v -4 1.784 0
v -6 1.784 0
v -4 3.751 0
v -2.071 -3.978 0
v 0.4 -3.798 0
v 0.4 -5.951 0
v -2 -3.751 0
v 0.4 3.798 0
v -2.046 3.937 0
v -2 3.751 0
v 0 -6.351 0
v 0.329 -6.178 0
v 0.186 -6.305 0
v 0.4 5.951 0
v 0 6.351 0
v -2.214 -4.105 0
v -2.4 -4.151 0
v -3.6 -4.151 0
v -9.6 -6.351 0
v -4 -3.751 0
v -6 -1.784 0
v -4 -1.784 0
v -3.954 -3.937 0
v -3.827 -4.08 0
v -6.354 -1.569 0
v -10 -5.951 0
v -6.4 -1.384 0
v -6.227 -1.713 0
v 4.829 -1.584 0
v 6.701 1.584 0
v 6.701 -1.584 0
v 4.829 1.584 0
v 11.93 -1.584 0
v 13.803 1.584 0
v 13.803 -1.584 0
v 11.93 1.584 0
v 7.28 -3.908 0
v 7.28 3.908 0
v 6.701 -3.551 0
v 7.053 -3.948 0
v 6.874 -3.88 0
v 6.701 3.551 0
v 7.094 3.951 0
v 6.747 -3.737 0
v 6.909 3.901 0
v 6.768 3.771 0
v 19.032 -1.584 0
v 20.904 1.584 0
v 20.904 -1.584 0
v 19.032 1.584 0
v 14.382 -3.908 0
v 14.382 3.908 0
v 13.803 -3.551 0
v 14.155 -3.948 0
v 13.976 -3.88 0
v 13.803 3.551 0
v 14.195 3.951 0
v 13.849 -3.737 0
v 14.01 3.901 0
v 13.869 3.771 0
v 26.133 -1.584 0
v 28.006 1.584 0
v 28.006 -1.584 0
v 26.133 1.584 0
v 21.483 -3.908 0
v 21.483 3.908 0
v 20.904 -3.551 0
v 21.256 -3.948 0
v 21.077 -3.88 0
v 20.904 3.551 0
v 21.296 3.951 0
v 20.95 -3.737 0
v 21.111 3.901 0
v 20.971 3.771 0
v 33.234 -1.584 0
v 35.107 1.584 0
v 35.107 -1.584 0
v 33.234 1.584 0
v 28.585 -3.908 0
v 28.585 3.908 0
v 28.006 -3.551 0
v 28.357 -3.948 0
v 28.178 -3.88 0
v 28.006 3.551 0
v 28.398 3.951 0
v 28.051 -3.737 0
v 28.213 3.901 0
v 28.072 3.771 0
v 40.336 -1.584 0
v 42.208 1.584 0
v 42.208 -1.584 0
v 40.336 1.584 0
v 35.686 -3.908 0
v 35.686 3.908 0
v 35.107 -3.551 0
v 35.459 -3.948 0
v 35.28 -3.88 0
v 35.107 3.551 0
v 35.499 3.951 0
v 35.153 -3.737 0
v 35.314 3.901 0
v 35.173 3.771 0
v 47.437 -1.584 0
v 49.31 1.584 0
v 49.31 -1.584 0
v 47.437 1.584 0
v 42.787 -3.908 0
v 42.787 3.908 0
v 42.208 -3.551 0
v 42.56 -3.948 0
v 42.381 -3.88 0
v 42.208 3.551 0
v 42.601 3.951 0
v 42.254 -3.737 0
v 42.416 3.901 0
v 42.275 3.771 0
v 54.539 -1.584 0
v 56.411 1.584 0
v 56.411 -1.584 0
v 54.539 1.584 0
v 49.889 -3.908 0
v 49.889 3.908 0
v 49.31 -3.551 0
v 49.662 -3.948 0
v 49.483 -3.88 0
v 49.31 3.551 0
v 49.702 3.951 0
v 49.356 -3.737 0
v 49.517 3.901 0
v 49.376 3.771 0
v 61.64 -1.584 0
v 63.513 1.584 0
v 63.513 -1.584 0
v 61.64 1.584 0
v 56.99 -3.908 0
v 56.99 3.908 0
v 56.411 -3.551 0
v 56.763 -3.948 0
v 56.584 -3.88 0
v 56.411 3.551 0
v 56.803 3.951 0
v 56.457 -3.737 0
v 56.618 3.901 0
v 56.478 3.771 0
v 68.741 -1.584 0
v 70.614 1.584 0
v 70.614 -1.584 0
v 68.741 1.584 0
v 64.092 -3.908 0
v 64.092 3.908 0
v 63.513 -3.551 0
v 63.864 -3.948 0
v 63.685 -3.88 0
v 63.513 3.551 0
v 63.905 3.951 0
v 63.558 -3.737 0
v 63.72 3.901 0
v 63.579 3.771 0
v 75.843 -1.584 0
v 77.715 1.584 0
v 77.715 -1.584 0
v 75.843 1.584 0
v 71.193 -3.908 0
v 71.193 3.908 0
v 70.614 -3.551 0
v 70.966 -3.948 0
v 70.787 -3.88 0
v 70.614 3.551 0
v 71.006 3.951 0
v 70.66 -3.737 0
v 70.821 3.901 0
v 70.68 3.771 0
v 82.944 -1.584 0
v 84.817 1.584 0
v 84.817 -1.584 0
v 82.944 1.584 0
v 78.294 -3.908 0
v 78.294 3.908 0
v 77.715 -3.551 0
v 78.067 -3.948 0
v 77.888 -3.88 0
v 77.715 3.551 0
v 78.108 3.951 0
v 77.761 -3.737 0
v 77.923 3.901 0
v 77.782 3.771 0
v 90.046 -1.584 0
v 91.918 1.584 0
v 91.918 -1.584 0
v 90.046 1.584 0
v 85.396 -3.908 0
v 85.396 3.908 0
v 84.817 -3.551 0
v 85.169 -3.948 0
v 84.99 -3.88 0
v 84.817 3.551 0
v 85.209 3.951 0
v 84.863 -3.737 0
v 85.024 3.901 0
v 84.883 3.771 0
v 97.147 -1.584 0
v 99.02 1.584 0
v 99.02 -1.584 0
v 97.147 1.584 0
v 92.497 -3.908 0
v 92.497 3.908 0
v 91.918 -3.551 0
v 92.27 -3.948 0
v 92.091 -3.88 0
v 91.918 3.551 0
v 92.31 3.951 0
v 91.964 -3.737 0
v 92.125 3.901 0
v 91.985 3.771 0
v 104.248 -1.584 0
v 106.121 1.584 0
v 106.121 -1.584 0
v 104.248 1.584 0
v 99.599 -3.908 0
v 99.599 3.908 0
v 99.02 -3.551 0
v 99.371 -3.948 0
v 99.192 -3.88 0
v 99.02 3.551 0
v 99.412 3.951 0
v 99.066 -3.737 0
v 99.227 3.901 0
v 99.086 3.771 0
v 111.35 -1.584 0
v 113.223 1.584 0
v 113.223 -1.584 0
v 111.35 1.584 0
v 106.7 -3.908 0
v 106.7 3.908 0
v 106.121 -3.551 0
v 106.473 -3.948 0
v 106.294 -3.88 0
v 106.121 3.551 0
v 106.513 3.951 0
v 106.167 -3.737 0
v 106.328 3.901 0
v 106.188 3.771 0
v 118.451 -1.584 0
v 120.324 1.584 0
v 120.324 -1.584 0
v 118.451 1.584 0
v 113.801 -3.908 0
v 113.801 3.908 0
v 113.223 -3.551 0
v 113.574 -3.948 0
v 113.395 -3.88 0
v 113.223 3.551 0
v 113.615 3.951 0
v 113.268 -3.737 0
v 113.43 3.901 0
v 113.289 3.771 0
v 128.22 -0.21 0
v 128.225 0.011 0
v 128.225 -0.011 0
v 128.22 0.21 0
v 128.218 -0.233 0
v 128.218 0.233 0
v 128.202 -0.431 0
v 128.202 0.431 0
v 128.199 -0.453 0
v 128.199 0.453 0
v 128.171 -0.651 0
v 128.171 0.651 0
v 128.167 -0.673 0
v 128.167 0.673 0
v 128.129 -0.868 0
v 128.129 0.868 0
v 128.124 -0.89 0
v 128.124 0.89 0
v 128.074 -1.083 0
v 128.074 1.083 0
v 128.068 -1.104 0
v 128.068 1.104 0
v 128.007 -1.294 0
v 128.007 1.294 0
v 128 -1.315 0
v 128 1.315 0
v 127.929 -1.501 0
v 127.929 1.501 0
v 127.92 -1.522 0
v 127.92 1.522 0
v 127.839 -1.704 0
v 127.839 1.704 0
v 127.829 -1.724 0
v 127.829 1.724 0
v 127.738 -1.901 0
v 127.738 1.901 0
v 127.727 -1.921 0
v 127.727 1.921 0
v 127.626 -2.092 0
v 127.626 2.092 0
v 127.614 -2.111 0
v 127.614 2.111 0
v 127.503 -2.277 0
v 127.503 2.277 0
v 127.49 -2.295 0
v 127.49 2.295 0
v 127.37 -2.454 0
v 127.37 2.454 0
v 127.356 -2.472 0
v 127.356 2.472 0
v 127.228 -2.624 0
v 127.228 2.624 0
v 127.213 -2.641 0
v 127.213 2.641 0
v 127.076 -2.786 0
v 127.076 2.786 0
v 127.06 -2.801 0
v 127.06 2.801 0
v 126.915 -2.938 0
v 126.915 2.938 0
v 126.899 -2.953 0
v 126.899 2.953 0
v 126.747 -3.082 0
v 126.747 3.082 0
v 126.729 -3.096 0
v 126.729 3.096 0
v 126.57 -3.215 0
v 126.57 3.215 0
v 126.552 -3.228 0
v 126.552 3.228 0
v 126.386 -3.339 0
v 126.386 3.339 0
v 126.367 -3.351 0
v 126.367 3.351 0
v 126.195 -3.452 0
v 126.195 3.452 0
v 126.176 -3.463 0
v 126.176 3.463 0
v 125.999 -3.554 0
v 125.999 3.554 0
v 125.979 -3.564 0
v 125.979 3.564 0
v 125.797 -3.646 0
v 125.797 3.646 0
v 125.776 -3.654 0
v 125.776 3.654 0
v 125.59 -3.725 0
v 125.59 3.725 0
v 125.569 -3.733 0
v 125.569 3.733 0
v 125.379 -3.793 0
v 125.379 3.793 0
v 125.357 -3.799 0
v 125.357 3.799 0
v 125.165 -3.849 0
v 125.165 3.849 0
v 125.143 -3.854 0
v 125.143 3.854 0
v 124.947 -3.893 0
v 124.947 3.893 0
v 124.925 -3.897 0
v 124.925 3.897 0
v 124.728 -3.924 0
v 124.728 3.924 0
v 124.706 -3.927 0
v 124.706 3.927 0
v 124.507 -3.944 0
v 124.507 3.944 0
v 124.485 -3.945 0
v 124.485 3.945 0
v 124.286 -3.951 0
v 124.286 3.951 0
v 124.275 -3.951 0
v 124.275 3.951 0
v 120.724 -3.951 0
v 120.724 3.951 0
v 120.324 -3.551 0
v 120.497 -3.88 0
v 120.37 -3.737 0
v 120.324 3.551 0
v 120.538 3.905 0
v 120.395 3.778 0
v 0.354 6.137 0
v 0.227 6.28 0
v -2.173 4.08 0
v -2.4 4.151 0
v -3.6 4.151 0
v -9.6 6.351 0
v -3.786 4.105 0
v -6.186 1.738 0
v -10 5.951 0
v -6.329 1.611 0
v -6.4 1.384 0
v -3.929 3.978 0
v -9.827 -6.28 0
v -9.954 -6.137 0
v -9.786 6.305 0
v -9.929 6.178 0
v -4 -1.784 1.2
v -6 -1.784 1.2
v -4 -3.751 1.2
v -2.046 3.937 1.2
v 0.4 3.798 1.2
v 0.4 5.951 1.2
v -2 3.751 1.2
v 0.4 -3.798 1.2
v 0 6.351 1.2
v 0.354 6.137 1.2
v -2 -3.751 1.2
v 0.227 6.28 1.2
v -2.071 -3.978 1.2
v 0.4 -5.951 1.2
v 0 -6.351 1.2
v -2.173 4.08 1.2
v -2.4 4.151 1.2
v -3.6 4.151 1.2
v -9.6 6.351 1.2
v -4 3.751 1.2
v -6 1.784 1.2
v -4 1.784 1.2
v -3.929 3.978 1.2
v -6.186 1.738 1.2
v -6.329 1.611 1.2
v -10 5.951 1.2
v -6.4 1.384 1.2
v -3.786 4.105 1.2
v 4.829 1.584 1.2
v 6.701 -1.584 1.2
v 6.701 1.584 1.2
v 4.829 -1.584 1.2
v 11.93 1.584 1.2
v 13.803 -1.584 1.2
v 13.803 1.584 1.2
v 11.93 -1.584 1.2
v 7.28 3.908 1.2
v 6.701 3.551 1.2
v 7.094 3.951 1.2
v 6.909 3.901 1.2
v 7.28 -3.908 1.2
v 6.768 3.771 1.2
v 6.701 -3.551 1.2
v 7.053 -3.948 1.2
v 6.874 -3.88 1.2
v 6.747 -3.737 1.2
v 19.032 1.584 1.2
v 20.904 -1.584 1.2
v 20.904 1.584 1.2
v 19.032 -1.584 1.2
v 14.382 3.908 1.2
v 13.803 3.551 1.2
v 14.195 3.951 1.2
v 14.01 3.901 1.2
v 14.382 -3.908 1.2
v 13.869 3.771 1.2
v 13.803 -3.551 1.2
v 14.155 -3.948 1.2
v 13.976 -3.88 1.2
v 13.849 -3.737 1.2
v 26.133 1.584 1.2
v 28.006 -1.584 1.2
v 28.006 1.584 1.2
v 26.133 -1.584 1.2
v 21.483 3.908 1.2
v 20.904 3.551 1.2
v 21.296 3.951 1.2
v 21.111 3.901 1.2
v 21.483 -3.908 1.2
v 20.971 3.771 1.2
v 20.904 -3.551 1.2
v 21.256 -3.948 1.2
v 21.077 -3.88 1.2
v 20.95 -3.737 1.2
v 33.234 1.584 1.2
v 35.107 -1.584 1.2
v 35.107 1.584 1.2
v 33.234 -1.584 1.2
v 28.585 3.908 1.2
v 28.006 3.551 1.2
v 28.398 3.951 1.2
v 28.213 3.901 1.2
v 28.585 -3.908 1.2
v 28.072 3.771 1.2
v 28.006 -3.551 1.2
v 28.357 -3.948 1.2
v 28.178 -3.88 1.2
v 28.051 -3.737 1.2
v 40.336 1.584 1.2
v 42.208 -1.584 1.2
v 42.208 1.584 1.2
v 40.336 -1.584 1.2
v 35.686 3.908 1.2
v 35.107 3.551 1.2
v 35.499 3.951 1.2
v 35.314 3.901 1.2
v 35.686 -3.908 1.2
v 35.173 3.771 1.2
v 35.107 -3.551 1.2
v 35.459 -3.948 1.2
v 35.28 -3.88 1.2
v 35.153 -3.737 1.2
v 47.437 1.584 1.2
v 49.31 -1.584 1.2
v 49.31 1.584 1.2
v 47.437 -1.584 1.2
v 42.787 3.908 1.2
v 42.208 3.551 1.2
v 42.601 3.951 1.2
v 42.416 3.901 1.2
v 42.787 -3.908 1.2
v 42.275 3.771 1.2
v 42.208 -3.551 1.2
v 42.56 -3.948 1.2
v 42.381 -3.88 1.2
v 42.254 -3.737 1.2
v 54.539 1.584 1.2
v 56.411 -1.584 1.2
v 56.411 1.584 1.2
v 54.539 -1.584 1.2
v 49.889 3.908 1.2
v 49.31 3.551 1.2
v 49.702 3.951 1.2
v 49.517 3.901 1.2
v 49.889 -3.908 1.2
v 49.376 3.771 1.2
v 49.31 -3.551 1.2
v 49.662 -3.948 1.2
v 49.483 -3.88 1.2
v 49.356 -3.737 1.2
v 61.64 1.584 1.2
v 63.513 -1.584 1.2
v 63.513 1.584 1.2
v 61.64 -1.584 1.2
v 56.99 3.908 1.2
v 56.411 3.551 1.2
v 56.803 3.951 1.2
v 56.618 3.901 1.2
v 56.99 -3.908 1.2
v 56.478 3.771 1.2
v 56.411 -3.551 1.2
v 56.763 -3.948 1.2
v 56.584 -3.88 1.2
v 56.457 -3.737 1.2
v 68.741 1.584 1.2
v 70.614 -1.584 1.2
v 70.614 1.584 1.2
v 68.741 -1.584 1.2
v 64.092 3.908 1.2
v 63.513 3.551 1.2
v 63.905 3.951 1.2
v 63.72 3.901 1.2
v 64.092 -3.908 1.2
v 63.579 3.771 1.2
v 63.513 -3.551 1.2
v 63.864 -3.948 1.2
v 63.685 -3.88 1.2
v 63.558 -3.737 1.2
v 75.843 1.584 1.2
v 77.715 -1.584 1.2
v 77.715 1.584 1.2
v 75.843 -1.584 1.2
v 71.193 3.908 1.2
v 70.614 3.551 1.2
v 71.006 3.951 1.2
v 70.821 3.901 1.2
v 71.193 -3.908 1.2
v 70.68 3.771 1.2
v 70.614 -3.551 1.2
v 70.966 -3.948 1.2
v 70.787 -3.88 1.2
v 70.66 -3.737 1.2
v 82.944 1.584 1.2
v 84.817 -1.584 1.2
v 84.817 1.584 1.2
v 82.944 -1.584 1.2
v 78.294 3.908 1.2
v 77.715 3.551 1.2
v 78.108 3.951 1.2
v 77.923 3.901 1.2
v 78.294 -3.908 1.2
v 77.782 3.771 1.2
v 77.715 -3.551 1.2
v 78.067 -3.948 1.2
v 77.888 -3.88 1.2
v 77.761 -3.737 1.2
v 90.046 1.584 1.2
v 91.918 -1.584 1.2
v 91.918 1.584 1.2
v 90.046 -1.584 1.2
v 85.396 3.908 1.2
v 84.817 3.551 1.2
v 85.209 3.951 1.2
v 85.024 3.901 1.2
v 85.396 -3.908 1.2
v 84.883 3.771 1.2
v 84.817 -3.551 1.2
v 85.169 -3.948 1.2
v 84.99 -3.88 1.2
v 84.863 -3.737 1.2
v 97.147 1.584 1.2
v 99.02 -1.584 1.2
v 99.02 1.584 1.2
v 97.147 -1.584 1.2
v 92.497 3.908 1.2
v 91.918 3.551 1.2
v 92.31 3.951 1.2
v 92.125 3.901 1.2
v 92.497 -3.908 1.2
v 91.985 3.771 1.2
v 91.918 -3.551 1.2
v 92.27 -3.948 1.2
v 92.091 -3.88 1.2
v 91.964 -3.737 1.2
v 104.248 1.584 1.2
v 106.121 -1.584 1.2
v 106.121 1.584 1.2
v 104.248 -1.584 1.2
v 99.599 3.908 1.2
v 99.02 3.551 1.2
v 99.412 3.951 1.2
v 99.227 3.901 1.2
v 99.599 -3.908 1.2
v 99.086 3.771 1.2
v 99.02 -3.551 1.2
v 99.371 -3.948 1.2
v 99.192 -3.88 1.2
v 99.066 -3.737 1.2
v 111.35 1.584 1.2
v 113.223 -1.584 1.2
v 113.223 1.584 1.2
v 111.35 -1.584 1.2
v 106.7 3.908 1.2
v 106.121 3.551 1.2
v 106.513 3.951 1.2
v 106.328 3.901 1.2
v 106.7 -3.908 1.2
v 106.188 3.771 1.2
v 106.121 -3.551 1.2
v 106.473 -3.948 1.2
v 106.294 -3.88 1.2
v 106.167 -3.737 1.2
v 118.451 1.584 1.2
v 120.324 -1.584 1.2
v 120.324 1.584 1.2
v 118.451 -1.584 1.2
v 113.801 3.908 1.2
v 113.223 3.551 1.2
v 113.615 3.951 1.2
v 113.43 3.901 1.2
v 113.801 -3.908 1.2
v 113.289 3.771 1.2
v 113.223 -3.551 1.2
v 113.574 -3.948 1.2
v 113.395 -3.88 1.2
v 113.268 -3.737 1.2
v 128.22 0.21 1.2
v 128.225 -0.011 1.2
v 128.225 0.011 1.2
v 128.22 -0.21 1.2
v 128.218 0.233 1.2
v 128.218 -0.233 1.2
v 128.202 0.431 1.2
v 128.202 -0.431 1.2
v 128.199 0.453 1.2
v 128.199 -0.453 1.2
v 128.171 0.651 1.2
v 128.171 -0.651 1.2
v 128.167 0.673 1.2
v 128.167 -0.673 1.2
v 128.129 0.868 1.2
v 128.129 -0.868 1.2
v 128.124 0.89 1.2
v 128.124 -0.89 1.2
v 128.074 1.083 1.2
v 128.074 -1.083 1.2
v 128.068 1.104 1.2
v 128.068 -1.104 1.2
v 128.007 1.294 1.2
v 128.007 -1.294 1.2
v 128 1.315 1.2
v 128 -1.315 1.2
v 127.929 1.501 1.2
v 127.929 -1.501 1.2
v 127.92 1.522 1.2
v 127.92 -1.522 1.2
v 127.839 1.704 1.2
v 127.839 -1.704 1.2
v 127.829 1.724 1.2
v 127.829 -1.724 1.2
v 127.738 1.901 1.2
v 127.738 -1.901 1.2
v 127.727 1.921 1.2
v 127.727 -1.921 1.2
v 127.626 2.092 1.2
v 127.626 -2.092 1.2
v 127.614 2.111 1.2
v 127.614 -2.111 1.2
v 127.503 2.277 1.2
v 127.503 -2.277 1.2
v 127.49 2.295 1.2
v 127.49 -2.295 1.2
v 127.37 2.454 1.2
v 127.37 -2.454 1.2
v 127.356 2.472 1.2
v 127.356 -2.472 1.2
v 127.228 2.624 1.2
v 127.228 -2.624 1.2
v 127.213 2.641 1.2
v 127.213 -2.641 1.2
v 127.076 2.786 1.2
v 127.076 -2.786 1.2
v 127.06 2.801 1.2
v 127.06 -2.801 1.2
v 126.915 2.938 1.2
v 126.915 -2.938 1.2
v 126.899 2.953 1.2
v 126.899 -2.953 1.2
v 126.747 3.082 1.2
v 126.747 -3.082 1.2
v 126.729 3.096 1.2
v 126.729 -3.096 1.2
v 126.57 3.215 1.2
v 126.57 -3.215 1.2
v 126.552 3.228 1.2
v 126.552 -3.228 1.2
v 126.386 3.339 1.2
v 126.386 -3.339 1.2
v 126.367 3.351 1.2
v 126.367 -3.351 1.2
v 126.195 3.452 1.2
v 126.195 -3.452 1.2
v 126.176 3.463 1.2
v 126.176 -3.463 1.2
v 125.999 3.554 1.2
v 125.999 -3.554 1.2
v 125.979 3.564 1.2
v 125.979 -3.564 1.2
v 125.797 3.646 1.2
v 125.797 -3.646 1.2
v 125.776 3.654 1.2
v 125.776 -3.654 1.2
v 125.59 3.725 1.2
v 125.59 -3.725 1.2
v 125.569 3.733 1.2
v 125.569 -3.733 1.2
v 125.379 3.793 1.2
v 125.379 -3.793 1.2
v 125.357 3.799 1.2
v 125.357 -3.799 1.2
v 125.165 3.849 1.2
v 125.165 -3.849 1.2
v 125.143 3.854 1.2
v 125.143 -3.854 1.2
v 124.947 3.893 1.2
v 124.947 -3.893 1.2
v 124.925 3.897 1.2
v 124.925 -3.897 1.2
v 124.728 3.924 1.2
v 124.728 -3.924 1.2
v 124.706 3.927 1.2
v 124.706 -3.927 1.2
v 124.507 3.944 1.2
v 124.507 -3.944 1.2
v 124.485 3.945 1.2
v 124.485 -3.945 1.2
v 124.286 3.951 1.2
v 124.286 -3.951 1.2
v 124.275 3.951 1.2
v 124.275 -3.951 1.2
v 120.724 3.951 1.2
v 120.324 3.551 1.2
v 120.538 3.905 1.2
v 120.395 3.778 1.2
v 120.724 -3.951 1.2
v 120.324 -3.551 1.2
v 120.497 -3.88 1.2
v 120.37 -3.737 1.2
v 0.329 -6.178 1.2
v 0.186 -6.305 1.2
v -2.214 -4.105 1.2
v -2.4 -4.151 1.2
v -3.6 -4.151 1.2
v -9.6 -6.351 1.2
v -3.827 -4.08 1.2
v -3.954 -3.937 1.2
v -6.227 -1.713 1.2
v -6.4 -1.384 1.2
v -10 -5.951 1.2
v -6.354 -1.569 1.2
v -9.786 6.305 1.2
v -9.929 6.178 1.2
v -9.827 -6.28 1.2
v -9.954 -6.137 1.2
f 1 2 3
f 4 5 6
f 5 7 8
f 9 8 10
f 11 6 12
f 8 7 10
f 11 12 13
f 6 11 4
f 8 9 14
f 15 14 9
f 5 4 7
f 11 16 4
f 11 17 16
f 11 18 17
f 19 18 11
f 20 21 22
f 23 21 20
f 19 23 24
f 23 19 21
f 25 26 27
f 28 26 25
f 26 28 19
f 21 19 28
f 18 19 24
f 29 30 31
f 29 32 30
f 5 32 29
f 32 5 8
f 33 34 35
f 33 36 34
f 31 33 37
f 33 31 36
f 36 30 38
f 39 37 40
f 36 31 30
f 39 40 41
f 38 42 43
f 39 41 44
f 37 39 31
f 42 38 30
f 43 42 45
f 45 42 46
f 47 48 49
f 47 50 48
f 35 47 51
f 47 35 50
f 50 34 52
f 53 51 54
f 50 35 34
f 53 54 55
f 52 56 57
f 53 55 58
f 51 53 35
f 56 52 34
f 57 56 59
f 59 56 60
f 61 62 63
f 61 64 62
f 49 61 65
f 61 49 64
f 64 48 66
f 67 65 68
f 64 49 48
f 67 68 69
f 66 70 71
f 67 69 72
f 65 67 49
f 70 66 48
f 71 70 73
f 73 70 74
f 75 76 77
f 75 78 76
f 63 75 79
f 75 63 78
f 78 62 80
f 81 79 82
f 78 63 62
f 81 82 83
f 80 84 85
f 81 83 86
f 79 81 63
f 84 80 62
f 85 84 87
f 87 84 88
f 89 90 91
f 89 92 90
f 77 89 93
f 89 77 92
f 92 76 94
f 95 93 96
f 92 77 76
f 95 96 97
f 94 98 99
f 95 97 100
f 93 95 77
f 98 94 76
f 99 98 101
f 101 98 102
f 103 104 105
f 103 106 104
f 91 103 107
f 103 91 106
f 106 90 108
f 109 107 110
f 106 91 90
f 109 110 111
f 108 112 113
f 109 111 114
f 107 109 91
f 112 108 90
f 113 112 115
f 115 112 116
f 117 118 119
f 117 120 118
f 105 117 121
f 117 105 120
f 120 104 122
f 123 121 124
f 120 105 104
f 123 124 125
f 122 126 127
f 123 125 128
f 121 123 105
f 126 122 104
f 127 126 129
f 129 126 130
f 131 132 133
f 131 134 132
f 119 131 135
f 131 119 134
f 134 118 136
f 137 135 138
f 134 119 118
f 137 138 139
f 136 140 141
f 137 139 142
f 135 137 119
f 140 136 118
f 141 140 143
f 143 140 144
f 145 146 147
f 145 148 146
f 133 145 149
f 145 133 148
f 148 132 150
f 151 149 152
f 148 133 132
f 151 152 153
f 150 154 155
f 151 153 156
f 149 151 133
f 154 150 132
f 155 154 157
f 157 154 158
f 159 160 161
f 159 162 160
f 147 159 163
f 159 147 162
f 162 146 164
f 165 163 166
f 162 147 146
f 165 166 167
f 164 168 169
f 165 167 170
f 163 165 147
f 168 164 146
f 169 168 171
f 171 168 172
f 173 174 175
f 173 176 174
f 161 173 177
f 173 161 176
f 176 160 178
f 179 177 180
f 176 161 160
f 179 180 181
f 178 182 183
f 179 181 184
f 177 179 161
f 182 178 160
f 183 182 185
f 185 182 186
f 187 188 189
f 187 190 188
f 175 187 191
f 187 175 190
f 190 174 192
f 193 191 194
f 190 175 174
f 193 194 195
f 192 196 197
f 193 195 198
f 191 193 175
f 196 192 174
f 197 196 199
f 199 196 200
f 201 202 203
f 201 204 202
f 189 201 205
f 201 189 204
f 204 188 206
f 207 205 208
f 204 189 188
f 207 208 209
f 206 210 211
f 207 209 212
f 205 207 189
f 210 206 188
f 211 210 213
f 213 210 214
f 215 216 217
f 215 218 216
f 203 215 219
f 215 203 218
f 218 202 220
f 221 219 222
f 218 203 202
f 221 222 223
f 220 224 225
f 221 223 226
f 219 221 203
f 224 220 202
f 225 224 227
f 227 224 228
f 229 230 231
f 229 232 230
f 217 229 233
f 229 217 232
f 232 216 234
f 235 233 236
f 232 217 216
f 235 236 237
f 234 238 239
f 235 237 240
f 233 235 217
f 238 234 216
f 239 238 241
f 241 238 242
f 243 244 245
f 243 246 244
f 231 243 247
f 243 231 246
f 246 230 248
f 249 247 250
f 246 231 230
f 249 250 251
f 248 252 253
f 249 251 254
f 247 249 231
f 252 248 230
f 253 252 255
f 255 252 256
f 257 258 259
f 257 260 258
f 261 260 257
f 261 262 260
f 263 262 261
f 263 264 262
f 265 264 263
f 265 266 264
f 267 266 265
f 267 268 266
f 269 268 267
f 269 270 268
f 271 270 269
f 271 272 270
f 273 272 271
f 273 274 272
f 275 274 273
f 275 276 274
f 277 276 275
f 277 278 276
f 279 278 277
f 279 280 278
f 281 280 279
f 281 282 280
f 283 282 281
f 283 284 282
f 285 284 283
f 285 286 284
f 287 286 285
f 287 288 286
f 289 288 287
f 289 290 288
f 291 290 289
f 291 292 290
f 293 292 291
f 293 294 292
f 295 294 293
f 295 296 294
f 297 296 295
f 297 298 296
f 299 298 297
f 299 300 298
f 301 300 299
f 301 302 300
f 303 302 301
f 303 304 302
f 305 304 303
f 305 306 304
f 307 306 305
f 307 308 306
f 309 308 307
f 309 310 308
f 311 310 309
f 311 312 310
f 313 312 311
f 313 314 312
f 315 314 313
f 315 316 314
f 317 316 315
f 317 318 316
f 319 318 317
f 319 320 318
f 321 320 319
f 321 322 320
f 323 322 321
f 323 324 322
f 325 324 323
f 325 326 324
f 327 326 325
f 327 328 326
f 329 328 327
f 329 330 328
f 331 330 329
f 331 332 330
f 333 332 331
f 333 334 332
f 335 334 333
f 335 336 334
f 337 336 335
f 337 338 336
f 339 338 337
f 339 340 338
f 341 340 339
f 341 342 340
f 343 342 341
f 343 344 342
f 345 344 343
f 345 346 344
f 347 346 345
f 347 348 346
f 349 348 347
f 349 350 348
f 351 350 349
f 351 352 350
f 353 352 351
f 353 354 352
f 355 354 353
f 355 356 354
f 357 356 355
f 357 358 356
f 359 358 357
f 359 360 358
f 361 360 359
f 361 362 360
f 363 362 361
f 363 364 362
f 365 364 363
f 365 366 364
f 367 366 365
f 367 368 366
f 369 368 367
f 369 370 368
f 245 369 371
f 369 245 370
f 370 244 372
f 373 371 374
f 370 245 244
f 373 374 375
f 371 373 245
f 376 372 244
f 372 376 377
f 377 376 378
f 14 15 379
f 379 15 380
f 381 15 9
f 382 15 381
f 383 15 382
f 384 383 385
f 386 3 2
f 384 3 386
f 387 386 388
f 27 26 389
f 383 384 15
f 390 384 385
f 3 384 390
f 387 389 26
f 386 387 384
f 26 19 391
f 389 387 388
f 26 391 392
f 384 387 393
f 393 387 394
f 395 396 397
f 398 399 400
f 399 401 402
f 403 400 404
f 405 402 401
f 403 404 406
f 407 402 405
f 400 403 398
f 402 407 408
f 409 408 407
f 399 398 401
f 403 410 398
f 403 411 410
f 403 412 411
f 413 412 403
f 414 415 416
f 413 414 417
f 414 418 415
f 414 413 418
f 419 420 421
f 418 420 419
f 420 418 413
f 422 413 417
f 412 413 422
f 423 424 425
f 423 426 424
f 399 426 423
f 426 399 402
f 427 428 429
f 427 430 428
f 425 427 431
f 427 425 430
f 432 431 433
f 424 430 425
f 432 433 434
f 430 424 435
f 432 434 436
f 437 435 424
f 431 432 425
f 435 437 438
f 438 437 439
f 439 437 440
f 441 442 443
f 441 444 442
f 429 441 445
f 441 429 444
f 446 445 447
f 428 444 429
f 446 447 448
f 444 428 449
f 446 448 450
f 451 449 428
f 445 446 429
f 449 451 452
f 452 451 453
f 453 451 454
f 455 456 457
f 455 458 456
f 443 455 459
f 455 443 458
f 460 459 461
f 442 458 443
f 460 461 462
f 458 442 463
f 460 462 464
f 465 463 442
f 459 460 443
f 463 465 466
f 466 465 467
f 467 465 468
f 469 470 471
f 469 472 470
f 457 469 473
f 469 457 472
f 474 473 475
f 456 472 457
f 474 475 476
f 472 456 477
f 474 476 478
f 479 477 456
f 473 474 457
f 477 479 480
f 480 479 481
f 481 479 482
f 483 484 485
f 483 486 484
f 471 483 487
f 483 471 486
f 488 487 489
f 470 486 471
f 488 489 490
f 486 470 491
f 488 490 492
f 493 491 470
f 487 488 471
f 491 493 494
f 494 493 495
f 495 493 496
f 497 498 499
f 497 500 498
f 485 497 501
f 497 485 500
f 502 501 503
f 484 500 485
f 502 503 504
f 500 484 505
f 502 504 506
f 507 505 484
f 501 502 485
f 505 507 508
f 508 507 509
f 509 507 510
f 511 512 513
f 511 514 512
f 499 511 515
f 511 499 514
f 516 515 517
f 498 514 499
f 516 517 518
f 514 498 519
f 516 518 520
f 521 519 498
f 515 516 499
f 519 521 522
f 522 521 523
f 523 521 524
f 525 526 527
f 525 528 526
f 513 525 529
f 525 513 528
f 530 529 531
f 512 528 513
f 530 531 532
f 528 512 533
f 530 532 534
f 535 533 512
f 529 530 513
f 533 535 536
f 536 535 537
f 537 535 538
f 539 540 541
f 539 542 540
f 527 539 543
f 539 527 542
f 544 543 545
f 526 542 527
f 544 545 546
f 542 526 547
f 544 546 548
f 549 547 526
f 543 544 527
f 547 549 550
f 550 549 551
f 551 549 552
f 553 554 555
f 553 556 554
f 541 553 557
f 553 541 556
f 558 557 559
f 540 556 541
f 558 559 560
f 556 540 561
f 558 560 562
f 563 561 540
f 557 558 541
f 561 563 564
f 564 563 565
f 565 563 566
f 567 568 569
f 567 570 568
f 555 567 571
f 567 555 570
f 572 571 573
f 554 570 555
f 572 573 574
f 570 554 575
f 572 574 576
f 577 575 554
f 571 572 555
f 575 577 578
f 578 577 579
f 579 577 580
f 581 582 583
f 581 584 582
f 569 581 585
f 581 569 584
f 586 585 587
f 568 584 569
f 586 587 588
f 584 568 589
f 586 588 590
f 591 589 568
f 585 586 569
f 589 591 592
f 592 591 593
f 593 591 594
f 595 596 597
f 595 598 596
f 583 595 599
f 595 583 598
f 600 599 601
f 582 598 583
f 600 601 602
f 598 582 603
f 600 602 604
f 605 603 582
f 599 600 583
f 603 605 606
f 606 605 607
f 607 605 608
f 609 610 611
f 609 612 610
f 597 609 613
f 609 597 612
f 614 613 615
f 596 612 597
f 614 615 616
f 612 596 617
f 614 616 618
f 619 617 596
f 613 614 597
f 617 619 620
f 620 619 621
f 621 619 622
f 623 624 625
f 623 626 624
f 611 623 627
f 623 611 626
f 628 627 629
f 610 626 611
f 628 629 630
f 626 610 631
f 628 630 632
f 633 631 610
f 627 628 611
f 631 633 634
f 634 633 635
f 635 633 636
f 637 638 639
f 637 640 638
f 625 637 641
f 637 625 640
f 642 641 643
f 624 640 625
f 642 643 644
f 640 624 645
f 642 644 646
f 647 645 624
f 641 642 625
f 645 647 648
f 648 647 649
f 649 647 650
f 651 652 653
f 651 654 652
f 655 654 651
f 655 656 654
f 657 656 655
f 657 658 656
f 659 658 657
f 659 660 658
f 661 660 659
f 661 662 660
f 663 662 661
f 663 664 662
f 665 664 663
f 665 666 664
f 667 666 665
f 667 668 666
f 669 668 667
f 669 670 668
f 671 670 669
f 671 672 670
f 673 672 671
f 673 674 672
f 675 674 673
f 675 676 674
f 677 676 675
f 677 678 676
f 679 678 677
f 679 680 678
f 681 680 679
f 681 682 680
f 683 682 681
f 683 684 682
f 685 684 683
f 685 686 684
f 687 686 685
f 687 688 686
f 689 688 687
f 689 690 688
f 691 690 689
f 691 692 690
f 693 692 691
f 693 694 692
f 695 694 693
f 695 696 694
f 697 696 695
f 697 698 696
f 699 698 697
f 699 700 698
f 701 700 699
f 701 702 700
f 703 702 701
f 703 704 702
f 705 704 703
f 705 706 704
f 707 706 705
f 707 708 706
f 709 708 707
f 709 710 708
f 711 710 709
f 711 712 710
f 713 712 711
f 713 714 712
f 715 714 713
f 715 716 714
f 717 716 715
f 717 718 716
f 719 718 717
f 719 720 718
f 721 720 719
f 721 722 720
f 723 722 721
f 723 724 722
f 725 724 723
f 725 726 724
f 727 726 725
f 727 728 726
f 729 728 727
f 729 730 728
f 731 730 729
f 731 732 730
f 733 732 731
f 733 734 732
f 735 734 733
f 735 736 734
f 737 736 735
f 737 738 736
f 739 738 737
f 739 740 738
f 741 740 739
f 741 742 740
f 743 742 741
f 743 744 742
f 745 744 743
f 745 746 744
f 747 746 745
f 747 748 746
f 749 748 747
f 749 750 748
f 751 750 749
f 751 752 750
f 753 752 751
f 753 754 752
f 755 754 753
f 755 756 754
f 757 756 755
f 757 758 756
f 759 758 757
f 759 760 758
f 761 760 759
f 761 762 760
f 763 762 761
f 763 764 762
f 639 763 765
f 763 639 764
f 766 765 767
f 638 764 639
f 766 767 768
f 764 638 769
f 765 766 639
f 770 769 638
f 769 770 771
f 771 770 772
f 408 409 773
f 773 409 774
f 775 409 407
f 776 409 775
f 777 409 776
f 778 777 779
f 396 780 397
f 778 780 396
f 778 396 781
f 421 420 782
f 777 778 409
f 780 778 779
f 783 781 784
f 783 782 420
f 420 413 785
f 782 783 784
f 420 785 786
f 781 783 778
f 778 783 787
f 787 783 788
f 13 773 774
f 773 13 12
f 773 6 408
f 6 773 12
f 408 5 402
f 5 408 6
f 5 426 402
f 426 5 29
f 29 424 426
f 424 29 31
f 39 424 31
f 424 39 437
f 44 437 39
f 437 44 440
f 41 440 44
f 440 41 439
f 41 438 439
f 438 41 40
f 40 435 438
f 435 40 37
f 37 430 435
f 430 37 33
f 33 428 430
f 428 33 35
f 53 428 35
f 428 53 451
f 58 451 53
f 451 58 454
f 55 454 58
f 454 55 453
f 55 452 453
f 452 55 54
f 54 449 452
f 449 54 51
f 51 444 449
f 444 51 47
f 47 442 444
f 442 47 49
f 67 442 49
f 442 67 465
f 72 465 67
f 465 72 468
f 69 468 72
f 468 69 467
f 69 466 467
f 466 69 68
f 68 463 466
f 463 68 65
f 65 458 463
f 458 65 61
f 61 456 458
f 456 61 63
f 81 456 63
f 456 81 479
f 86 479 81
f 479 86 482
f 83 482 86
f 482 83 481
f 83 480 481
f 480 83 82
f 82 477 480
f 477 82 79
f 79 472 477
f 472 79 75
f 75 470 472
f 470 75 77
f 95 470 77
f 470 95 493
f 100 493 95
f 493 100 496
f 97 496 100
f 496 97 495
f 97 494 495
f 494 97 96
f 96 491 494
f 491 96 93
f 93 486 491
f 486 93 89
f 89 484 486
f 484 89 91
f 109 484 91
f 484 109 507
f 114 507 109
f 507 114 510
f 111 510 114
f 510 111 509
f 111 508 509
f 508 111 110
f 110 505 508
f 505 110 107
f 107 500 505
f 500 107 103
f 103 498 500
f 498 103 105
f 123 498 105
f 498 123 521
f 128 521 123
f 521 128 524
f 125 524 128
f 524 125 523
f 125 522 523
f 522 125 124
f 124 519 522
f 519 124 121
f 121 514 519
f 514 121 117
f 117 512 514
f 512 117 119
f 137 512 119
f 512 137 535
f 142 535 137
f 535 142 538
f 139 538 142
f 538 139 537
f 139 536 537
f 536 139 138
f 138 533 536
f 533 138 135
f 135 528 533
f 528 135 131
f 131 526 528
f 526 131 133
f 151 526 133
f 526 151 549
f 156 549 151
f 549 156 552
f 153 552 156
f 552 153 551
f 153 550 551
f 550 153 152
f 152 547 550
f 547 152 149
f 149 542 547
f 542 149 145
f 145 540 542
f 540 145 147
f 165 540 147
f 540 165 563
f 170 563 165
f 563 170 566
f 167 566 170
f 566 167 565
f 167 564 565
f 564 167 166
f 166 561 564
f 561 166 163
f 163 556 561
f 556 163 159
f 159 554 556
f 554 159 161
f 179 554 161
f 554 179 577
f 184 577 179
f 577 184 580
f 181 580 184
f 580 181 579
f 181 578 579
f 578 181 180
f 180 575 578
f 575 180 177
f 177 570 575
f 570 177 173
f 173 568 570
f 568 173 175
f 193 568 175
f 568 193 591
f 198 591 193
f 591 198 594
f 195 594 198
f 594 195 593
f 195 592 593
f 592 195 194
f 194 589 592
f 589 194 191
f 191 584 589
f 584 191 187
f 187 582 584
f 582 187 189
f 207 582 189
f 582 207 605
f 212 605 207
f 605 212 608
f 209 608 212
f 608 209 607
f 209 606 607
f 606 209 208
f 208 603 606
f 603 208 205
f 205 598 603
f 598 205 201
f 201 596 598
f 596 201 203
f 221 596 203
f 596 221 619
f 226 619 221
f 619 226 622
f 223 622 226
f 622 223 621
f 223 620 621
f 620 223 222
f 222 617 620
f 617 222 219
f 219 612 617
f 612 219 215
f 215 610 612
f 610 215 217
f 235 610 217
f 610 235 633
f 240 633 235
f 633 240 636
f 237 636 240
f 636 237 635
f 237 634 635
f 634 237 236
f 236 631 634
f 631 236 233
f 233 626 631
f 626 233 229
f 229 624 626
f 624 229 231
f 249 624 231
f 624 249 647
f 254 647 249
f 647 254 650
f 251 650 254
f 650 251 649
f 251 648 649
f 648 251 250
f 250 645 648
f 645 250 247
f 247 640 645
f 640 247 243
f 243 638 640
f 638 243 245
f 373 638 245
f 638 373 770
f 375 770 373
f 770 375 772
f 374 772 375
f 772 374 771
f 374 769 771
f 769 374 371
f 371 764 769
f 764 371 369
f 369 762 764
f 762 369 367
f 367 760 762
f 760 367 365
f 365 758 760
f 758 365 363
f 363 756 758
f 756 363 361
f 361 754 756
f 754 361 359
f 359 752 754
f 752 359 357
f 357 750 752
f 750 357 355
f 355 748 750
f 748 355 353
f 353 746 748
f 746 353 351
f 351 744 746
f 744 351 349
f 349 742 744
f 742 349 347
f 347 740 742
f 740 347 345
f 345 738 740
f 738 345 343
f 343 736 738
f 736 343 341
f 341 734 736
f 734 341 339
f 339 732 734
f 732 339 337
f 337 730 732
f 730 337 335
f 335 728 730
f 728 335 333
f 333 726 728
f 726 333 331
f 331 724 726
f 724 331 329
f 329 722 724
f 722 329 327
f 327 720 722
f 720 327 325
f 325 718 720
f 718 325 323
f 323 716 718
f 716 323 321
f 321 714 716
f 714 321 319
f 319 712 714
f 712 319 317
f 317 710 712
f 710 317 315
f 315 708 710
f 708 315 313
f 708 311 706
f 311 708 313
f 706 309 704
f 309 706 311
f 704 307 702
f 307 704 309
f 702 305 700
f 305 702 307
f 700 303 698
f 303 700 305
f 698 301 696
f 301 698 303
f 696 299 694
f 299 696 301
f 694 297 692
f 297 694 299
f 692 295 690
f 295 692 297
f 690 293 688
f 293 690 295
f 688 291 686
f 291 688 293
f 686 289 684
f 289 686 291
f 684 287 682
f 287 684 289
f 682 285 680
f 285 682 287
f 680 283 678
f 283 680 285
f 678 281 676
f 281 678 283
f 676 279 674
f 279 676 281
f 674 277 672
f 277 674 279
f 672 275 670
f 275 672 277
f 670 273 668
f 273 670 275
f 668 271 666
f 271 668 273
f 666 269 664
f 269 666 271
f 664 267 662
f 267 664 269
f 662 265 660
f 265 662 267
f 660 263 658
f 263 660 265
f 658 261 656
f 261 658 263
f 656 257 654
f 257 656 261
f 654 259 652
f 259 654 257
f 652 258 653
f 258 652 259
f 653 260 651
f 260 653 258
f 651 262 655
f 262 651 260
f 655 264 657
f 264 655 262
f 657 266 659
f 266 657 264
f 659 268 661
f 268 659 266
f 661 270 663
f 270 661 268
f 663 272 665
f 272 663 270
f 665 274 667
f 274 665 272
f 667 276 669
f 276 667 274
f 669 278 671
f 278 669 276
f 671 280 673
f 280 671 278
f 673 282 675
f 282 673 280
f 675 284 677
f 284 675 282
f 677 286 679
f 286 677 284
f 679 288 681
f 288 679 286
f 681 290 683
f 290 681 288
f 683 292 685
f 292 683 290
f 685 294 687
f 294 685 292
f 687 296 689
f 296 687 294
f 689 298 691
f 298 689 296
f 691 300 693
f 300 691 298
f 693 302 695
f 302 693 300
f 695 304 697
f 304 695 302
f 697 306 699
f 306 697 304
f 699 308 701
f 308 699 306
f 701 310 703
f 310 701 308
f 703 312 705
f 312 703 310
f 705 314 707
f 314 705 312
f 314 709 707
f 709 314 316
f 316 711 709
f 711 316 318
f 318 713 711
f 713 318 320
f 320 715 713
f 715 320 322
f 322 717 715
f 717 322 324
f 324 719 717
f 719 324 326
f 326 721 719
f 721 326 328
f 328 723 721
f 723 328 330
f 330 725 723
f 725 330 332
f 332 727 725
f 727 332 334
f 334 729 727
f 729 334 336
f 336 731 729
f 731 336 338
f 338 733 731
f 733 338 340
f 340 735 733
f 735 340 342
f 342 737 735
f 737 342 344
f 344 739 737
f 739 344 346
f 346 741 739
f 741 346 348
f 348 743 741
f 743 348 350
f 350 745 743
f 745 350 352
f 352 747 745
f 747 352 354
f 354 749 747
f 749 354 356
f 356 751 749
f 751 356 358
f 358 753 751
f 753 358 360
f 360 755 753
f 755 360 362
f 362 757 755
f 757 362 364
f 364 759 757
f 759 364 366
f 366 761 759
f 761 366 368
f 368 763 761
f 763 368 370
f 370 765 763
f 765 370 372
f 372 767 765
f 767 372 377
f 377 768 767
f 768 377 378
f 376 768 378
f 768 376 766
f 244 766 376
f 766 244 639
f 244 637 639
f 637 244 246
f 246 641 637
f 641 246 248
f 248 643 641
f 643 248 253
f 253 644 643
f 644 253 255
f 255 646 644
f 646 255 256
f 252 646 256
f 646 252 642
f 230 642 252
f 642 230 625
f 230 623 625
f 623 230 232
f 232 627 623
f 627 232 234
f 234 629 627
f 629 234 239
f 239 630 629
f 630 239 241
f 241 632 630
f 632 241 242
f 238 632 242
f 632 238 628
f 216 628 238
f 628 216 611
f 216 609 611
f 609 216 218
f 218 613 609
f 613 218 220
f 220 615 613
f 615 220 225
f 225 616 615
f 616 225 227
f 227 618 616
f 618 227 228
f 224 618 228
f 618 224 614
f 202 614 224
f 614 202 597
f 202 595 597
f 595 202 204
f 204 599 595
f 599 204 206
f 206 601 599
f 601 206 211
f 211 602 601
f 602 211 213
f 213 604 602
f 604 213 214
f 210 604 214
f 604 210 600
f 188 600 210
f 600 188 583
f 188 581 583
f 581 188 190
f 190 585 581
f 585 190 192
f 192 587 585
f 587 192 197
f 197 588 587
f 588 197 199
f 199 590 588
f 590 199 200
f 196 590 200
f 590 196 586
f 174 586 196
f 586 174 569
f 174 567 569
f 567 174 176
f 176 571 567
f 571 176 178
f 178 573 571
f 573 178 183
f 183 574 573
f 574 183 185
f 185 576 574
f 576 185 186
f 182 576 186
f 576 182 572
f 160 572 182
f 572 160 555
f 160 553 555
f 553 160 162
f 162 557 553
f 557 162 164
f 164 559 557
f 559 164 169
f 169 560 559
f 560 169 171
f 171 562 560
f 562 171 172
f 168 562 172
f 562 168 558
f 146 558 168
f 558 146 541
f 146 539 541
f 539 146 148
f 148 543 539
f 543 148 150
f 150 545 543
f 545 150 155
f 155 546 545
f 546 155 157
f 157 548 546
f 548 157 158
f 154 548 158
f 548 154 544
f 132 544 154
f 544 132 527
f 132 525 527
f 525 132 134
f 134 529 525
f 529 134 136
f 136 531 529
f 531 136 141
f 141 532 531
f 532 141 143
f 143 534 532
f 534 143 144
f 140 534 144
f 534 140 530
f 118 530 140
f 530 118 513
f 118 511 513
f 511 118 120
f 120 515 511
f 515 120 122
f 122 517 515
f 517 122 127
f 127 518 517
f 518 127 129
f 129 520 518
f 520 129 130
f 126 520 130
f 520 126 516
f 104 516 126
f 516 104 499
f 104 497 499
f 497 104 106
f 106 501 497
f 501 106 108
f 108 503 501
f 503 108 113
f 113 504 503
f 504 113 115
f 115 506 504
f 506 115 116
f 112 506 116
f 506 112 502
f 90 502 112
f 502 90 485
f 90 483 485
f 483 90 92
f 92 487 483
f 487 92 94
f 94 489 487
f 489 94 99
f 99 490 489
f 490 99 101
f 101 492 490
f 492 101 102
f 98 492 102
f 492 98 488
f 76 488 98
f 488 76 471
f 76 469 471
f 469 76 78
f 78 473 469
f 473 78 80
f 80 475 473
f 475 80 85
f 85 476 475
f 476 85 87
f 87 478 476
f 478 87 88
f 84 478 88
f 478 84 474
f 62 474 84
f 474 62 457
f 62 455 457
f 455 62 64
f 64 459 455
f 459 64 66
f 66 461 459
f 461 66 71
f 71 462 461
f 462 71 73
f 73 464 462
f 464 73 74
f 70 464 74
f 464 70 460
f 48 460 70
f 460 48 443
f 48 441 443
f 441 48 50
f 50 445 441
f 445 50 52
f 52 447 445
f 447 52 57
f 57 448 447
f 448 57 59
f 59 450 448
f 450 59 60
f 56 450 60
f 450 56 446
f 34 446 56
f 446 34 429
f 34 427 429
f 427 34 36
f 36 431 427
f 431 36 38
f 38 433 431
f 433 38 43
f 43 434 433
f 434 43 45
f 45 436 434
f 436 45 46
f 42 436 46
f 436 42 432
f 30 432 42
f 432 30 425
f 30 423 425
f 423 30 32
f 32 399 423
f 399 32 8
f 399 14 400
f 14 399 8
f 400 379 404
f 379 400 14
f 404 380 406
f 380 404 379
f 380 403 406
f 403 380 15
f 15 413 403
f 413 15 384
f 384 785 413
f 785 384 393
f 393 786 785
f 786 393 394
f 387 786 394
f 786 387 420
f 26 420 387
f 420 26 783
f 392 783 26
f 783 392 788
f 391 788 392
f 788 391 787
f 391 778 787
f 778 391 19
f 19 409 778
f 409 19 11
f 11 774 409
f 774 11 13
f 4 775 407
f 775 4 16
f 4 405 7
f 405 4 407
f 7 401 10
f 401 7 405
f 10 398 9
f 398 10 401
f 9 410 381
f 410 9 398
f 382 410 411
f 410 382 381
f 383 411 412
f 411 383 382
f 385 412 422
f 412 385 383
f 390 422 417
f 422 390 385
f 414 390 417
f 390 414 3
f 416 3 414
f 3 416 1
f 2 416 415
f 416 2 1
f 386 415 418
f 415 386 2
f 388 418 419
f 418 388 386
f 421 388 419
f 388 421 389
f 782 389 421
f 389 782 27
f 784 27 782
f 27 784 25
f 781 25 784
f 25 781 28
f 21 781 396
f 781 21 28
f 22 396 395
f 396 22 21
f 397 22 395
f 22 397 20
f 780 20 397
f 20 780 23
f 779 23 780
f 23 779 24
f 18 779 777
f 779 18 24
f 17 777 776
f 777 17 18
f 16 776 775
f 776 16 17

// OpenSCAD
/*
cabletie.scad generates cable ties primarly meant to be 3D printed in TPU

GNU General Public License v3.0
Permissions of this strong copyleft license are conditioned on making available complete source
code of licensed works and modifications, which include larger works using a licensed work, under
the same license. Copyright and license notices must be preserved. Contributors provide an express
grant of patent rights.
 */

// Variables default values
cabletie_width = 9;
cabletie_wrapping_diameter = 40;
cabletie_minimum_thickness = 1.2; // would be overrided if too large
label="";
label_font="Liberation Sans:style=Bold";

// FDM 3D printer parameters
nozzle_width = 0.4;
printer_tolerance = 0.2;

// Resolution
$fa=2; // default minimum facet angle
$fs=0.2; // default minimum facet size

module cabletie(w=cabletie_width,
                d=cabletie_wrapping_diameter,
                t=cabletie_minimum_thickness,
                l=label,
                nw=nozzle_width,
                pt=printer_tolerance) {

     // Funcions
     function cabletie_wrapping_circumference(d)
          = 3.14*d;
     function cabletie_steps_lenth(w, nw)
          = (w-2*nw)*cos(30);
     function cabletie_links_count(d, w, nw)
          = floor(cabletie_wrapping_circumference(d)/cabletie_steps_lenth(w, nw));
     function retainer_hole_length(w, nw)
          = cabletie_steps_lenth(w, nw)/3;
     function release_hole_length(w, nw)
          = cabletie_steps_lenth(w, nw);
     function cabletie_maximum_thickness(w, nw)
          = (cabletie_steps_lenth(w, nw)/3+nw)/tan(30)-(nw/sin(30)-nw);
     function cabletie_thickness(mini_thickness, maxi_thickness)
          = mini_thickness > maxi_thickness ? maxi_thickness : mini_thickness;
     function cabletie_lock_length()
          = cabletie_thickness(t, cabletie_maximum_thickness(w, nw))*8;
     function cabletie_lock_width()
          = cabletie_thickness(t, cabletie_maximum_thickness(w, nw))*4+release_hole_length(w, nw);

     // Generates the links
     module cabletie_links() {
          for (i = [0 : cabletie_steps_lenth(w, nw) : cabletie_steps_lenth(w, nw)*(cabletie_links_count(d, w, nw)-1)]) {
               translate([i, 0, 0]) {
                    // Shape of a regular links
                    polygon(points=[[0,0],
                                    [0,cabletie_steps_lenth(w, nw)/2],
                                    [cabletie_steps_lenth(w, nw),0],
                                    [0,-cabletie_steps_lenth(w, nw)/2]]);
               }
          }
          // Last link custom shape
          translate([cabletie_steps_lenth(w, nw)*(cabletie_links_count(d, w, nw)+1/2), 0, 0]) {
               circle(d = cabletie_steps_lenth(w, nw));
          }
          translate([cabletie_steps_lenth(w, nw)*(cabletie_links_count(d, w, nw)), -cabletie_steps_lenth(w, nw)/2, 0]) {
               square([cabletie_steps_lenth(w, nw)/2, cabletie_steps_lenth(w, nw)]);
          }
          // Connect all links
          translate([0, -(cabletie_steps_lenth(w, nw)/3)/2, 0]) {
               square([cabletie_steps_lenth(w, nw)*(cabletie_links_count(d, w, nw)), cabletie_steps_lenth(w, nw)/3]);
          }
     }

     // Generates the cabletie lock frame
     module cabletie_lock_boundary() {
          translate([-cabletie_lock_length(),
                     -cabletie_lock_width()/2,
                     0]) {
               square([cabletie_lock_length(),
                       cabletie_lock_width()]);
          }
     }

     // Generates the cabletie lock hole
     module cabletie_lock_hole() {
          union() {
               translate([-3/8*cabletie_lock_length(),
                          -release_hole_length(w, nw)/2-printer_tolerance,
                          0])
                    square([cabletie_thickness(t, cabletie_maximum_thickness(w, nw)),
                            release_hole_length(w, nw)+2*printer_tolerance]);
               // retainer hole
               translate([-5/8*cabletie_lock_length(),
                          -retainer_hole_length(w, nw)/2-printer_tolerance,
                          0])
                    square([2/8*cabletie_lock_length(),
                            retainer_hole_length(w, nw)+2*printer_tolerance]);
          }
     }

     // Generates text
     module cabletie_text(l) {
          translate([-cabletie_lock_length(), 0, 0]) {
               resize([0, 0.7*cabletie_lock_width()], auto=true) {
                    text(l, valign = "center", halign = "right", font = label_font);
               }
          }
     }

     // Generates label boundary
     module cabletie_label_boundary(l) {
          minkowski() {
               resize([0, 0.7*cabletie_lock_width()])
                    hull() projection() translate([0, 1/2, 0]) rotate([90, 0, 0]) linear_extrude(1) cabletie_text(l);
               circle(d=0.3*cabletie_lock_width());
          }
     }
     // Main
     difference() {
          // Positive shapes
          linear_extrude(cabletie_thickness(t, cabletie_maximum_thickness(w, nw))) {
               offset(r = nw) {
                    union() {
                         cabletie_links();
                         hull() {
                              cabletie_lock_boundary();
                              cabletie_label_boundary(l);
                         }
                    }
               }
          }
          // Negative shapes
          union() {
               translate([0, 0, cabletie_thickness(t, cabletie_maximum_thickness(w, nw))/2]) {
                    linear_extrude(cabletie_thickness(t, cabletie_maximum_thickness(w, nw))/2) {
                         cabletie_text(l);
                    }
               }
               linear_extrude(cabletie_thickness(t, cabletie_maximum_thickness(w, nw))) {
                    offset(r = nw) {
                         cabletie_lock_hole();
                    }
               }
          }
     }
}

// Customizer
cabletie();
